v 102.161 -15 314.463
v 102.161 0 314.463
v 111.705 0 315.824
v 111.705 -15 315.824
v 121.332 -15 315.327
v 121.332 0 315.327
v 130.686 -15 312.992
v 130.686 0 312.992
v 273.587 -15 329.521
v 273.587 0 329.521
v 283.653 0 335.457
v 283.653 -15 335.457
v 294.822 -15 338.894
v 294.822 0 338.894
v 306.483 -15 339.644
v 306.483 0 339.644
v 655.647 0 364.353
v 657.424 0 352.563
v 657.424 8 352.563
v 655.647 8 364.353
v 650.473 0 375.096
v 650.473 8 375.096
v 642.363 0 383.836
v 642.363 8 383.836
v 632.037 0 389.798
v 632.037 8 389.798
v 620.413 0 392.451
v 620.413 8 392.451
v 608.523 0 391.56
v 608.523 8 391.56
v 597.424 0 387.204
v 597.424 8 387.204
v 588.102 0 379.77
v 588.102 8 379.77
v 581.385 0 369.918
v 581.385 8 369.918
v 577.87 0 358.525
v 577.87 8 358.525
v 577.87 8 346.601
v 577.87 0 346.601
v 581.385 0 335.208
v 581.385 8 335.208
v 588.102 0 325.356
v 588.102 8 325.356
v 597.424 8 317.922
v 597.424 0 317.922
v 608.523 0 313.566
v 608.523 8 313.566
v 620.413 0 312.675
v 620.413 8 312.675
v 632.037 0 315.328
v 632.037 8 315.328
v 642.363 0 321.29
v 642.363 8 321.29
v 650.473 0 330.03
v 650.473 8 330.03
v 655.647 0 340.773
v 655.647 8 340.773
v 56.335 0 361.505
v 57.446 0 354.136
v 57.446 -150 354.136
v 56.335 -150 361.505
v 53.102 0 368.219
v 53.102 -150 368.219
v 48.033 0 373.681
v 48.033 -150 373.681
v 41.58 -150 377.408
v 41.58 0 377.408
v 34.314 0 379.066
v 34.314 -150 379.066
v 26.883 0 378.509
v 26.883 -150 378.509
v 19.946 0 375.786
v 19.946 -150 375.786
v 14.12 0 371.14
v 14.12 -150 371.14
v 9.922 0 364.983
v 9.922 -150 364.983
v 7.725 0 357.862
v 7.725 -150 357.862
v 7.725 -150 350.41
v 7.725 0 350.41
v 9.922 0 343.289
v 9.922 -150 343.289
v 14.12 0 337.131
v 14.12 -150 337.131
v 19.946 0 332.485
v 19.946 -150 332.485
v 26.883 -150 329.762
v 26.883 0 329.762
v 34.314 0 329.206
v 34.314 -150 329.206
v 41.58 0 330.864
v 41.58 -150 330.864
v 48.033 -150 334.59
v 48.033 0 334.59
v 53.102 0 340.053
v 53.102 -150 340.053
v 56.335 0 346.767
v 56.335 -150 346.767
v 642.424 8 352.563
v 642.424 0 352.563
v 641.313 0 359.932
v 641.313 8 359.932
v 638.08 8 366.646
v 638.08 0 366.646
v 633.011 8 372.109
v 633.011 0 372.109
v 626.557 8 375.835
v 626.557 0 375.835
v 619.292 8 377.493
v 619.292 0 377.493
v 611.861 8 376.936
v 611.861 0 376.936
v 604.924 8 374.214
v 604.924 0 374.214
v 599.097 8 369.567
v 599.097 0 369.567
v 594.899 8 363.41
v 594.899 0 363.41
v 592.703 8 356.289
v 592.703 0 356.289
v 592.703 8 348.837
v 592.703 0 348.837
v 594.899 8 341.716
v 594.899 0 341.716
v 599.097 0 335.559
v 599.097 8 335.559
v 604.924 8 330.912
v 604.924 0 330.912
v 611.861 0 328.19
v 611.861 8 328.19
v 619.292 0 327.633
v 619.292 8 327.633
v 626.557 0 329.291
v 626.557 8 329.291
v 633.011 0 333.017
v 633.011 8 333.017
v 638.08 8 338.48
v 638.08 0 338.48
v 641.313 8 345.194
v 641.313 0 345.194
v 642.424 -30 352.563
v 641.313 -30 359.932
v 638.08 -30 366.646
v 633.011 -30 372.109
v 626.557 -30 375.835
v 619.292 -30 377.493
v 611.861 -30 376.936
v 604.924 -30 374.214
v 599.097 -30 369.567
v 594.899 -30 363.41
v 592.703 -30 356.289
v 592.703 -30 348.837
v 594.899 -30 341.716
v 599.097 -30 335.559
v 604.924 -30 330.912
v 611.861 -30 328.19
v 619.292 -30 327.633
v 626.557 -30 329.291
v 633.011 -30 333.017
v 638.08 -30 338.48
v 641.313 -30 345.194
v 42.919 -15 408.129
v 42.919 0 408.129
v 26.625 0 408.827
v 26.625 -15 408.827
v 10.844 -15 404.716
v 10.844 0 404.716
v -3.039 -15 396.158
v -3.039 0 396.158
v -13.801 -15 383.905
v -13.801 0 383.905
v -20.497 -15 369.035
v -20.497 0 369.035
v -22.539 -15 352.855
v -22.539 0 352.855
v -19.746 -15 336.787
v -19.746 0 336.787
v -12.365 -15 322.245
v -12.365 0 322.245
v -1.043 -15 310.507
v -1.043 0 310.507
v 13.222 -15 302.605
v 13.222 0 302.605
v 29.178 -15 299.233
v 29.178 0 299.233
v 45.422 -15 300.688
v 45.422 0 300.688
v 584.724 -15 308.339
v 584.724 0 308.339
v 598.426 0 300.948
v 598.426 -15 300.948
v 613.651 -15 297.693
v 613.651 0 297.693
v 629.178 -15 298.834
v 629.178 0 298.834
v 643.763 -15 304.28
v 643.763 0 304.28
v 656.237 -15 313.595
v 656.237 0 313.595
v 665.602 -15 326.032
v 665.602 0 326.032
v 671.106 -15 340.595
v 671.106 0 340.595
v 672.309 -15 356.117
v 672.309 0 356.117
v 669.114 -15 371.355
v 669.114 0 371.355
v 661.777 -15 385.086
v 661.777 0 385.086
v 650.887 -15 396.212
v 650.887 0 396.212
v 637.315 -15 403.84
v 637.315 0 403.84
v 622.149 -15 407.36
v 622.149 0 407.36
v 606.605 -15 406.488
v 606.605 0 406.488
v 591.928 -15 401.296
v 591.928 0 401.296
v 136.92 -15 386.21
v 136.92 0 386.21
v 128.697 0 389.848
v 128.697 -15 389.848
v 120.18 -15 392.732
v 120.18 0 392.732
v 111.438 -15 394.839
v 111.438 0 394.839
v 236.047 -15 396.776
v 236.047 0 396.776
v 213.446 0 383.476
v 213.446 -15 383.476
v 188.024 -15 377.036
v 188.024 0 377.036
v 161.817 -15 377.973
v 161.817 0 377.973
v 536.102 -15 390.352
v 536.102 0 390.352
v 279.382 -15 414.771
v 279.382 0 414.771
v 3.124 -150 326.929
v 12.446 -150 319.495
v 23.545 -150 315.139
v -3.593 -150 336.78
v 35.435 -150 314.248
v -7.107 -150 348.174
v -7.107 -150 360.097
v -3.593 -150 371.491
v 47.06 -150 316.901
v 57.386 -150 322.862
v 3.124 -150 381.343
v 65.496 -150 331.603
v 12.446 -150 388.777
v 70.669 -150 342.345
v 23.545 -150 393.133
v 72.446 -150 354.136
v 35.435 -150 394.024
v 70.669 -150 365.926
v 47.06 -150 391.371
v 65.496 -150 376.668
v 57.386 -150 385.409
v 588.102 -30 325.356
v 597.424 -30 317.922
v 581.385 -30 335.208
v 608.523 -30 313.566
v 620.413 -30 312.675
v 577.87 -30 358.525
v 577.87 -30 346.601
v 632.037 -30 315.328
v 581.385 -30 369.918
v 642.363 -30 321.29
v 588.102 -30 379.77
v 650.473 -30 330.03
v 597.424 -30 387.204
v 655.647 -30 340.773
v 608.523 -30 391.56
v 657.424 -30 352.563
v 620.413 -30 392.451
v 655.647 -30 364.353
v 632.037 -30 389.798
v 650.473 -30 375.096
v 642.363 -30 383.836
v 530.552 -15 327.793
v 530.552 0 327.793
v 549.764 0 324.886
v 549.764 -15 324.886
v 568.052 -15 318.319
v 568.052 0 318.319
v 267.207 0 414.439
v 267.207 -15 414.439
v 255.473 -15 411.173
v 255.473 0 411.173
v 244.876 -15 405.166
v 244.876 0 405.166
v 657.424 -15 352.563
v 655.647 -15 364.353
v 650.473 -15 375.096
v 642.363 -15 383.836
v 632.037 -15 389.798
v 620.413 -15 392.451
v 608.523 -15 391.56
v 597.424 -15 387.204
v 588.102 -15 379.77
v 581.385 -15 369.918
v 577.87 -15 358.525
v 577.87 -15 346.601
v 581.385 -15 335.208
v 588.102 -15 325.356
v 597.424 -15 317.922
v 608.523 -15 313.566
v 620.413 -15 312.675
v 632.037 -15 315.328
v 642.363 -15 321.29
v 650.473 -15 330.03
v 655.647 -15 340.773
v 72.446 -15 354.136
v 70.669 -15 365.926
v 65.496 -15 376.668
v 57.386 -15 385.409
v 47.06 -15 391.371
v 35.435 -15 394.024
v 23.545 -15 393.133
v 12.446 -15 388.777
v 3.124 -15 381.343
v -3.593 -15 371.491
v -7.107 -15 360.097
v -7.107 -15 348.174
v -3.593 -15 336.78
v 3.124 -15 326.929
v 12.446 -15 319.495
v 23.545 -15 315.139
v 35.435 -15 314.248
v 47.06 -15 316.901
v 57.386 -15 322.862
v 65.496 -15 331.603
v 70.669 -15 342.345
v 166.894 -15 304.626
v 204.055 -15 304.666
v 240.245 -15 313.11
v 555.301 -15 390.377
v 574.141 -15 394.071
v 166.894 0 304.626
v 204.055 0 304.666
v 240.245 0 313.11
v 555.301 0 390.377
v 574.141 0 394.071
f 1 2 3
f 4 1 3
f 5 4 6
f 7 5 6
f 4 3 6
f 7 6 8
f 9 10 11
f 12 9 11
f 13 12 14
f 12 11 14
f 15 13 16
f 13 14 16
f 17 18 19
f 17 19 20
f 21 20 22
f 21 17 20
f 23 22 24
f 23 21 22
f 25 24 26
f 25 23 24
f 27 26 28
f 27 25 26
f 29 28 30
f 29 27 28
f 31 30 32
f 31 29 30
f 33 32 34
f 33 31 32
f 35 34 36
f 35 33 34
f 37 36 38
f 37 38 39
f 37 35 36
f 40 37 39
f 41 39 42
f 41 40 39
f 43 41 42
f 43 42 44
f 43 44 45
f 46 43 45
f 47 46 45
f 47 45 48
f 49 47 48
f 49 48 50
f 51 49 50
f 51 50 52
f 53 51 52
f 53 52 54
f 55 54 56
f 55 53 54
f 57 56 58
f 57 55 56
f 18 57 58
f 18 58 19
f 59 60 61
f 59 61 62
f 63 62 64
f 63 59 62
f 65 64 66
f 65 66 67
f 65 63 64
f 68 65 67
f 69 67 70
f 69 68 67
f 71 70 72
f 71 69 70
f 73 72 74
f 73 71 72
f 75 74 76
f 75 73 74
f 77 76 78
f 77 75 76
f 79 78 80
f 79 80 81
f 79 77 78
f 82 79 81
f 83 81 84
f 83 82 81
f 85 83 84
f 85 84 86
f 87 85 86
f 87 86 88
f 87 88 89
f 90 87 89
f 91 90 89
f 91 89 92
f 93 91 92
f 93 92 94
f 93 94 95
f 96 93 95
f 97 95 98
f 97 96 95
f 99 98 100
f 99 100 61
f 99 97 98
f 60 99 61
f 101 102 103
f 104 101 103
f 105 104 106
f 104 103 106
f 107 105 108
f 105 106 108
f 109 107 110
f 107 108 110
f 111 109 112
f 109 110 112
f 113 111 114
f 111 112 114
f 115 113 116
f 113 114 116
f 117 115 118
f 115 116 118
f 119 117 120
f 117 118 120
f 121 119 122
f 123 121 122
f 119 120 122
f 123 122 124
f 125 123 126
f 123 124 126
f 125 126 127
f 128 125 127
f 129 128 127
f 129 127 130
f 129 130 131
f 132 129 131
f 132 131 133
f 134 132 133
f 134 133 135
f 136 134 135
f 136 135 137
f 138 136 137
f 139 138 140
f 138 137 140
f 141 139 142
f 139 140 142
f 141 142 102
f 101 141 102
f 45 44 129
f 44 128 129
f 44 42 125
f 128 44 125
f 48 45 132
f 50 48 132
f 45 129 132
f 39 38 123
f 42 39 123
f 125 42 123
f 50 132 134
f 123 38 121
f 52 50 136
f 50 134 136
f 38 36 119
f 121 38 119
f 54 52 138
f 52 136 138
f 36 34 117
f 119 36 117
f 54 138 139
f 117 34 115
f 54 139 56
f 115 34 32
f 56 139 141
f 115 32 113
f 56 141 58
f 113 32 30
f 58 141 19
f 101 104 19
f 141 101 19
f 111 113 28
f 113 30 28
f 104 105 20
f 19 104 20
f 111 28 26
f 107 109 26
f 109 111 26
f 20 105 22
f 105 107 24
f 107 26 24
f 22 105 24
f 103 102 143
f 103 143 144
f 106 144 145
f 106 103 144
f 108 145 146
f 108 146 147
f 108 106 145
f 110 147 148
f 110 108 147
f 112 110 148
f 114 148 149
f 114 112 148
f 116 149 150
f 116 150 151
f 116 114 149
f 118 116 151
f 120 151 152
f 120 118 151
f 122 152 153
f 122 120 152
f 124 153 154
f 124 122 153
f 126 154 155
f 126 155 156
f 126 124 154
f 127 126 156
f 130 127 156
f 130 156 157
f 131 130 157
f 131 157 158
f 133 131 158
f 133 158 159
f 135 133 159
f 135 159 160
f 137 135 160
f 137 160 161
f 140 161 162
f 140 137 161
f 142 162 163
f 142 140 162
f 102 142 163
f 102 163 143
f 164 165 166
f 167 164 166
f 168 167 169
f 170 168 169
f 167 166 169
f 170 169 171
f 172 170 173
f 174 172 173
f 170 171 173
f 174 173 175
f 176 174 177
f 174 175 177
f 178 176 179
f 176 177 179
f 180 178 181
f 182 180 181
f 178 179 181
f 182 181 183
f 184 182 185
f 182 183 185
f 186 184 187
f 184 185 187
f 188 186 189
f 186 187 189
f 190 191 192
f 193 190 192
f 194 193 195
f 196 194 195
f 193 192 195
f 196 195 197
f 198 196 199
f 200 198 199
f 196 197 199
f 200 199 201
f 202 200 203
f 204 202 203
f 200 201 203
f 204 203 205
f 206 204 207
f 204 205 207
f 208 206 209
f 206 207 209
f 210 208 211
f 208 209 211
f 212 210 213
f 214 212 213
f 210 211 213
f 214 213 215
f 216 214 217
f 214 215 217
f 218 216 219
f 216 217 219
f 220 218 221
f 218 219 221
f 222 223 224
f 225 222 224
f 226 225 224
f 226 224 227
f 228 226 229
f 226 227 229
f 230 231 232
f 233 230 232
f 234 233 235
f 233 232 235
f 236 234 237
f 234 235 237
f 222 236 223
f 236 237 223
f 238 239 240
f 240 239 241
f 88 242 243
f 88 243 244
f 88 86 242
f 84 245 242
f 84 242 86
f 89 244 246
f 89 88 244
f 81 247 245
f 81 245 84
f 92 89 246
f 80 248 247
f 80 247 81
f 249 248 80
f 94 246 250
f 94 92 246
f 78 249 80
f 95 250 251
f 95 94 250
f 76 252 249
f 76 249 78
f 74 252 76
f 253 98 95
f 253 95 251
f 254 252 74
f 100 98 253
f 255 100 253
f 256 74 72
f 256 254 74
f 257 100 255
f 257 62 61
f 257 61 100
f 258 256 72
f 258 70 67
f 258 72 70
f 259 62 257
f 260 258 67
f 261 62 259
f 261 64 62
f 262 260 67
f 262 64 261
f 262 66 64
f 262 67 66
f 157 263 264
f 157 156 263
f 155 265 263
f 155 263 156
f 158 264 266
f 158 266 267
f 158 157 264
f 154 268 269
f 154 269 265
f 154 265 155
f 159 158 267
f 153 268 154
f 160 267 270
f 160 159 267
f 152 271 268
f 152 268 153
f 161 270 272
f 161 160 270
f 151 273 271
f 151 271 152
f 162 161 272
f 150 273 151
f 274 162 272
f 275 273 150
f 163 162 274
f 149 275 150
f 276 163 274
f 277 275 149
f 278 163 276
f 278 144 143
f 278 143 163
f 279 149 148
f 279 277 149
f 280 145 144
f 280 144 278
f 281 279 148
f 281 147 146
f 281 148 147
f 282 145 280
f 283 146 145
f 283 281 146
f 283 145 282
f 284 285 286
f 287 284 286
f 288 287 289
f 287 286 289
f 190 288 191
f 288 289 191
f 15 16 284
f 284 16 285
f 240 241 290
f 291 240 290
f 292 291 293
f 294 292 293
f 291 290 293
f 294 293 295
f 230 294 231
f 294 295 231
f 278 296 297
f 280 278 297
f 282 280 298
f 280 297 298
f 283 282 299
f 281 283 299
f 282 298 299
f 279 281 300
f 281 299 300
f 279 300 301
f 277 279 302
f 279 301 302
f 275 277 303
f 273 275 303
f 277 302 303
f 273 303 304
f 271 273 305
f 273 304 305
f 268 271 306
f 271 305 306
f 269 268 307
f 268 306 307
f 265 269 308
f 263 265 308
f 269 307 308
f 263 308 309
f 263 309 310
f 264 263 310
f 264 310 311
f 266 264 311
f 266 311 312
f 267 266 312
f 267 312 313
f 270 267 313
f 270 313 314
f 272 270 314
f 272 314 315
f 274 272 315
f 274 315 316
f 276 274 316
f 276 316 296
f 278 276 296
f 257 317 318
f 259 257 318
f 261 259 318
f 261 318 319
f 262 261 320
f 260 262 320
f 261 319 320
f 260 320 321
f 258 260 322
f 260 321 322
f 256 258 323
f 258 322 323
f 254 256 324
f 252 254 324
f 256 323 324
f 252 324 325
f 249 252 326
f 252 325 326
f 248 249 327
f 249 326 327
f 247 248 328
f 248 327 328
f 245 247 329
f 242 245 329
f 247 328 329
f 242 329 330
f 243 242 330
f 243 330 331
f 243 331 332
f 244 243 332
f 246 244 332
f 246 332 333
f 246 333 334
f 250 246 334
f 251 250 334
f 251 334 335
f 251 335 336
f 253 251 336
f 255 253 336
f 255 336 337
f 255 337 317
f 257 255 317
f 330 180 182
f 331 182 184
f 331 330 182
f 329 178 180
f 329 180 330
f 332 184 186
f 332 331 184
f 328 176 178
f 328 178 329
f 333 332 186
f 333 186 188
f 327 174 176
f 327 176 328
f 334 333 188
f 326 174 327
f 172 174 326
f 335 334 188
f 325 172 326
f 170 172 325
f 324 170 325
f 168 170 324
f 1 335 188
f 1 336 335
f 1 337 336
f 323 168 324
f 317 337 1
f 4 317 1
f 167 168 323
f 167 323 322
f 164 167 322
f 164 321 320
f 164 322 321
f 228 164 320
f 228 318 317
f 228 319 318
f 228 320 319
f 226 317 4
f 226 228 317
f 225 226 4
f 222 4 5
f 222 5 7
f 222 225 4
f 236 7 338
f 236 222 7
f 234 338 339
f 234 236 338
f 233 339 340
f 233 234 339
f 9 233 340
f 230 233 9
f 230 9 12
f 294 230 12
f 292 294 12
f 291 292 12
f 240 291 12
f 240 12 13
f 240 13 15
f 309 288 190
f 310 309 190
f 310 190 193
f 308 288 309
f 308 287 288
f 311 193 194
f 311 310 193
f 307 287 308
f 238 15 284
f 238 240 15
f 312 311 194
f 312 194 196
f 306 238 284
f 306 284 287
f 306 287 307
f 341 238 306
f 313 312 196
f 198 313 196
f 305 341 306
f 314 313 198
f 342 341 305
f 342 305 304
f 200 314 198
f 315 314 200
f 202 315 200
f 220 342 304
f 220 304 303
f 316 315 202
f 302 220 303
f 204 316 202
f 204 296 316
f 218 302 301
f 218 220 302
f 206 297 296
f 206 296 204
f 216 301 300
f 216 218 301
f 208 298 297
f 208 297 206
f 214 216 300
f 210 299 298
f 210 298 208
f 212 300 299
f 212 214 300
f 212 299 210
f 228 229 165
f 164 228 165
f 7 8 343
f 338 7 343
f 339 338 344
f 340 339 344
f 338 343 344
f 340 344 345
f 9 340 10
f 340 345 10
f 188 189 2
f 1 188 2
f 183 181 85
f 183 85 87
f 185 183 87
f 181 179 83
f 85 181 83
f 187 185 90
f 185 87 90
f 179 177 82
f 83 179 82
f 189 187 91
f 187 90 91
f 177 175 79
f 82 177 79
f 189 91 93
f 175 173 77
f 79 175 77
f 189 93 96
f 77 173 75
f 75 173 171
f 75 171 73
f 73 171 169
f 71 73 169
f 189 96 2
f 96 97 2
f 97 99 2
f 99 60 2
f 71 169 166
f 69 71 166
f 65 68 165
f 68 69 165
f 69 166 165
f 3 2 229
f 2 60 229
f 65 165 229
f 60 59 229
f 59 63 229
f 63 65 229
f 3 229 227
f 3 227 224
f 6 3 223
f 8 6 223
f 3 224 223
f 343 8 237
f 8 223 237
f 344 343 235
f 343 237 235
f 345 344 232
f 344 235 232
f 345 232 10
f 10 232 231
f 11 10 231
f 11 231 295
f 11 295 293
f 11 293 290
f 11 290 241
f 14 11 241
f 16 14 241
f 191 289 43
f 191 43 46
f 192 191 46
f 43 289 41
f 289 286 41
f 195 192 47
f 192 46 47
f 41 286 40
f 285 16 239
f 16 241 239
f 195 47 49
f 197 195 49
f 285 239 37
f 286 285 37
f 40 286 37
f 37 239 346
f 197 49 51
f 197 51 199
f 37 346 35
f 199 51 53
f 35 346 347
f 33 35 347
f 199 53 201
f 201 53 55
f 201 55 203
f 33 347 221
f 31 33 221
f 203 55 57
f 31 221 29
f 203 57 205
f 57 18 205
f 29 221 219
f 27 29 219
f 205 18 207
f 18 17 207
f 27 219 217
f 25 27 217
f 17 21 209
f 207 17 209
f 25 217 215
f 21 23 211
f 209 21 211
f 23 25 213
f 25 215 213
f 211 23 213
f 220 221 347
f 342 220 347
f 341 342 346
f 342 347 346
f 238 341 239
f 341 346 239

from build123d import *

# Parameters (mm, degrees)
F0_R     = 40
F1_DEPTH = 15
F0_R_2   = 25
F2_DEPTH = 150
F3_DEPTH = 30
F4_DEPTH = 8


# Not quite as in the source:
# - ends of sketch curves that miss each other by under 0.0002 mm in the source are joined


with BuildPart() as f1:
    # F0 (on Front) → F1 (new body)
    with BuildSketch(Plane.XZ):
        with BuildLine():
            ThreePointArc((136.9199448282, 386.2104516544), (124.4705090254, 391.3857217921), (111.4380638613, 394.8393062852))
            Line((111.4380638613, 394.8393062852), (42.918713, 408.129393))
            ThreePointArc((42.918713, 408.129393), (-22.539049679, 352.8547276711), (45.4216669824, 300.6881840726))
            Line((45.4216669824, 300.6881840726), (102.160582, 314.462893))
            ThreePointArc((102.160582, 314.462893), (116.5305641711, 315.8079808018), (130.6860790256, 312.992479072))
            ThreePointArc((130.6860790256, 312.992479072), (204.0553442227, 304.6657026983), (273.5865736459, 329.5211325506))
            ThreePointArc((273.5865736459, 329.5211325506), (289.1363732598, 337.5026610827), (306.4832439925, 339.6444218586))
            Line((306.4832439925, 339.6444218586), (530.552186, 327.792845))
            ThreePointArc((530.552186, 327.792845), (559.0680406559, 322.0478617496), (584.7240709532, 308.3392179368))
            ThreePointArc((584.7240709532, 308.3392179368), (672.2592374085, 348.3136045992), (591.9275499624, 401.2964030718))
            ThreePointArc((591.9275499624, 401.2964030718), (564.8093719906, 391.7707004398), (536.1018479581, 390.3520205594))
            Line((536.1018479581, 390.3520205594), (279.382043, 414.771009))
            ThreePointArc((279.382043, 414.771009), (255.4725507994, 411.172762836), (236.0470033399, 396.7762595435))
            ThreePointArc((236.0470033399, 396.7762595435), (188.0244125036, 377.0364695299), (136.9199448282, 386.2104516544))
        make_face()
        with Locations((32.446032, 354.135662)):
            Circle(F0_R, mode=Mode.SUBTRACT)
        with Locations((617.423637, 352.562949)):
            Circle(F0_R, mode=Mode.SUBTRACT)
    extrude(amount=F1_DEPTH)

    # F0 (on Front) → F2 (join)
    with BuildSketch(Plane.XZ):
        with Locations((32.446032, 354.135662)):
            Circle(F0_R)
        with Locations((32.446032, 354.135662)):
            Circle(F0_R_2, mode=Mode.SUBTRACT)
    extrude(amount=F2_DEPTH)

    # F0 (on Front) → F3 (join)
    with BuildSketch(Plane.XZ):
        with Locations((617.423637, 352.562949)):
            Circle(F0_R)
        with Locations((617.423637, 352.562949)):
            Circle(F0_R_2, mode=Mode.SUBTRACT)
    extrude(amount=F3_DEPTH)

    # F0 (on Front) → F4 (join)
    with BuildSketch(Plane.XZ):
        with Locations((617.423637, 352.562949)):
            Circle(F0_R)
        with Locations((617.423637, 352.562949)):
            Circle(F0_R_2, mode=Mode.SUBTRACT)
    extrude(amount=-F4_DEPTH)


solid = f1.part
